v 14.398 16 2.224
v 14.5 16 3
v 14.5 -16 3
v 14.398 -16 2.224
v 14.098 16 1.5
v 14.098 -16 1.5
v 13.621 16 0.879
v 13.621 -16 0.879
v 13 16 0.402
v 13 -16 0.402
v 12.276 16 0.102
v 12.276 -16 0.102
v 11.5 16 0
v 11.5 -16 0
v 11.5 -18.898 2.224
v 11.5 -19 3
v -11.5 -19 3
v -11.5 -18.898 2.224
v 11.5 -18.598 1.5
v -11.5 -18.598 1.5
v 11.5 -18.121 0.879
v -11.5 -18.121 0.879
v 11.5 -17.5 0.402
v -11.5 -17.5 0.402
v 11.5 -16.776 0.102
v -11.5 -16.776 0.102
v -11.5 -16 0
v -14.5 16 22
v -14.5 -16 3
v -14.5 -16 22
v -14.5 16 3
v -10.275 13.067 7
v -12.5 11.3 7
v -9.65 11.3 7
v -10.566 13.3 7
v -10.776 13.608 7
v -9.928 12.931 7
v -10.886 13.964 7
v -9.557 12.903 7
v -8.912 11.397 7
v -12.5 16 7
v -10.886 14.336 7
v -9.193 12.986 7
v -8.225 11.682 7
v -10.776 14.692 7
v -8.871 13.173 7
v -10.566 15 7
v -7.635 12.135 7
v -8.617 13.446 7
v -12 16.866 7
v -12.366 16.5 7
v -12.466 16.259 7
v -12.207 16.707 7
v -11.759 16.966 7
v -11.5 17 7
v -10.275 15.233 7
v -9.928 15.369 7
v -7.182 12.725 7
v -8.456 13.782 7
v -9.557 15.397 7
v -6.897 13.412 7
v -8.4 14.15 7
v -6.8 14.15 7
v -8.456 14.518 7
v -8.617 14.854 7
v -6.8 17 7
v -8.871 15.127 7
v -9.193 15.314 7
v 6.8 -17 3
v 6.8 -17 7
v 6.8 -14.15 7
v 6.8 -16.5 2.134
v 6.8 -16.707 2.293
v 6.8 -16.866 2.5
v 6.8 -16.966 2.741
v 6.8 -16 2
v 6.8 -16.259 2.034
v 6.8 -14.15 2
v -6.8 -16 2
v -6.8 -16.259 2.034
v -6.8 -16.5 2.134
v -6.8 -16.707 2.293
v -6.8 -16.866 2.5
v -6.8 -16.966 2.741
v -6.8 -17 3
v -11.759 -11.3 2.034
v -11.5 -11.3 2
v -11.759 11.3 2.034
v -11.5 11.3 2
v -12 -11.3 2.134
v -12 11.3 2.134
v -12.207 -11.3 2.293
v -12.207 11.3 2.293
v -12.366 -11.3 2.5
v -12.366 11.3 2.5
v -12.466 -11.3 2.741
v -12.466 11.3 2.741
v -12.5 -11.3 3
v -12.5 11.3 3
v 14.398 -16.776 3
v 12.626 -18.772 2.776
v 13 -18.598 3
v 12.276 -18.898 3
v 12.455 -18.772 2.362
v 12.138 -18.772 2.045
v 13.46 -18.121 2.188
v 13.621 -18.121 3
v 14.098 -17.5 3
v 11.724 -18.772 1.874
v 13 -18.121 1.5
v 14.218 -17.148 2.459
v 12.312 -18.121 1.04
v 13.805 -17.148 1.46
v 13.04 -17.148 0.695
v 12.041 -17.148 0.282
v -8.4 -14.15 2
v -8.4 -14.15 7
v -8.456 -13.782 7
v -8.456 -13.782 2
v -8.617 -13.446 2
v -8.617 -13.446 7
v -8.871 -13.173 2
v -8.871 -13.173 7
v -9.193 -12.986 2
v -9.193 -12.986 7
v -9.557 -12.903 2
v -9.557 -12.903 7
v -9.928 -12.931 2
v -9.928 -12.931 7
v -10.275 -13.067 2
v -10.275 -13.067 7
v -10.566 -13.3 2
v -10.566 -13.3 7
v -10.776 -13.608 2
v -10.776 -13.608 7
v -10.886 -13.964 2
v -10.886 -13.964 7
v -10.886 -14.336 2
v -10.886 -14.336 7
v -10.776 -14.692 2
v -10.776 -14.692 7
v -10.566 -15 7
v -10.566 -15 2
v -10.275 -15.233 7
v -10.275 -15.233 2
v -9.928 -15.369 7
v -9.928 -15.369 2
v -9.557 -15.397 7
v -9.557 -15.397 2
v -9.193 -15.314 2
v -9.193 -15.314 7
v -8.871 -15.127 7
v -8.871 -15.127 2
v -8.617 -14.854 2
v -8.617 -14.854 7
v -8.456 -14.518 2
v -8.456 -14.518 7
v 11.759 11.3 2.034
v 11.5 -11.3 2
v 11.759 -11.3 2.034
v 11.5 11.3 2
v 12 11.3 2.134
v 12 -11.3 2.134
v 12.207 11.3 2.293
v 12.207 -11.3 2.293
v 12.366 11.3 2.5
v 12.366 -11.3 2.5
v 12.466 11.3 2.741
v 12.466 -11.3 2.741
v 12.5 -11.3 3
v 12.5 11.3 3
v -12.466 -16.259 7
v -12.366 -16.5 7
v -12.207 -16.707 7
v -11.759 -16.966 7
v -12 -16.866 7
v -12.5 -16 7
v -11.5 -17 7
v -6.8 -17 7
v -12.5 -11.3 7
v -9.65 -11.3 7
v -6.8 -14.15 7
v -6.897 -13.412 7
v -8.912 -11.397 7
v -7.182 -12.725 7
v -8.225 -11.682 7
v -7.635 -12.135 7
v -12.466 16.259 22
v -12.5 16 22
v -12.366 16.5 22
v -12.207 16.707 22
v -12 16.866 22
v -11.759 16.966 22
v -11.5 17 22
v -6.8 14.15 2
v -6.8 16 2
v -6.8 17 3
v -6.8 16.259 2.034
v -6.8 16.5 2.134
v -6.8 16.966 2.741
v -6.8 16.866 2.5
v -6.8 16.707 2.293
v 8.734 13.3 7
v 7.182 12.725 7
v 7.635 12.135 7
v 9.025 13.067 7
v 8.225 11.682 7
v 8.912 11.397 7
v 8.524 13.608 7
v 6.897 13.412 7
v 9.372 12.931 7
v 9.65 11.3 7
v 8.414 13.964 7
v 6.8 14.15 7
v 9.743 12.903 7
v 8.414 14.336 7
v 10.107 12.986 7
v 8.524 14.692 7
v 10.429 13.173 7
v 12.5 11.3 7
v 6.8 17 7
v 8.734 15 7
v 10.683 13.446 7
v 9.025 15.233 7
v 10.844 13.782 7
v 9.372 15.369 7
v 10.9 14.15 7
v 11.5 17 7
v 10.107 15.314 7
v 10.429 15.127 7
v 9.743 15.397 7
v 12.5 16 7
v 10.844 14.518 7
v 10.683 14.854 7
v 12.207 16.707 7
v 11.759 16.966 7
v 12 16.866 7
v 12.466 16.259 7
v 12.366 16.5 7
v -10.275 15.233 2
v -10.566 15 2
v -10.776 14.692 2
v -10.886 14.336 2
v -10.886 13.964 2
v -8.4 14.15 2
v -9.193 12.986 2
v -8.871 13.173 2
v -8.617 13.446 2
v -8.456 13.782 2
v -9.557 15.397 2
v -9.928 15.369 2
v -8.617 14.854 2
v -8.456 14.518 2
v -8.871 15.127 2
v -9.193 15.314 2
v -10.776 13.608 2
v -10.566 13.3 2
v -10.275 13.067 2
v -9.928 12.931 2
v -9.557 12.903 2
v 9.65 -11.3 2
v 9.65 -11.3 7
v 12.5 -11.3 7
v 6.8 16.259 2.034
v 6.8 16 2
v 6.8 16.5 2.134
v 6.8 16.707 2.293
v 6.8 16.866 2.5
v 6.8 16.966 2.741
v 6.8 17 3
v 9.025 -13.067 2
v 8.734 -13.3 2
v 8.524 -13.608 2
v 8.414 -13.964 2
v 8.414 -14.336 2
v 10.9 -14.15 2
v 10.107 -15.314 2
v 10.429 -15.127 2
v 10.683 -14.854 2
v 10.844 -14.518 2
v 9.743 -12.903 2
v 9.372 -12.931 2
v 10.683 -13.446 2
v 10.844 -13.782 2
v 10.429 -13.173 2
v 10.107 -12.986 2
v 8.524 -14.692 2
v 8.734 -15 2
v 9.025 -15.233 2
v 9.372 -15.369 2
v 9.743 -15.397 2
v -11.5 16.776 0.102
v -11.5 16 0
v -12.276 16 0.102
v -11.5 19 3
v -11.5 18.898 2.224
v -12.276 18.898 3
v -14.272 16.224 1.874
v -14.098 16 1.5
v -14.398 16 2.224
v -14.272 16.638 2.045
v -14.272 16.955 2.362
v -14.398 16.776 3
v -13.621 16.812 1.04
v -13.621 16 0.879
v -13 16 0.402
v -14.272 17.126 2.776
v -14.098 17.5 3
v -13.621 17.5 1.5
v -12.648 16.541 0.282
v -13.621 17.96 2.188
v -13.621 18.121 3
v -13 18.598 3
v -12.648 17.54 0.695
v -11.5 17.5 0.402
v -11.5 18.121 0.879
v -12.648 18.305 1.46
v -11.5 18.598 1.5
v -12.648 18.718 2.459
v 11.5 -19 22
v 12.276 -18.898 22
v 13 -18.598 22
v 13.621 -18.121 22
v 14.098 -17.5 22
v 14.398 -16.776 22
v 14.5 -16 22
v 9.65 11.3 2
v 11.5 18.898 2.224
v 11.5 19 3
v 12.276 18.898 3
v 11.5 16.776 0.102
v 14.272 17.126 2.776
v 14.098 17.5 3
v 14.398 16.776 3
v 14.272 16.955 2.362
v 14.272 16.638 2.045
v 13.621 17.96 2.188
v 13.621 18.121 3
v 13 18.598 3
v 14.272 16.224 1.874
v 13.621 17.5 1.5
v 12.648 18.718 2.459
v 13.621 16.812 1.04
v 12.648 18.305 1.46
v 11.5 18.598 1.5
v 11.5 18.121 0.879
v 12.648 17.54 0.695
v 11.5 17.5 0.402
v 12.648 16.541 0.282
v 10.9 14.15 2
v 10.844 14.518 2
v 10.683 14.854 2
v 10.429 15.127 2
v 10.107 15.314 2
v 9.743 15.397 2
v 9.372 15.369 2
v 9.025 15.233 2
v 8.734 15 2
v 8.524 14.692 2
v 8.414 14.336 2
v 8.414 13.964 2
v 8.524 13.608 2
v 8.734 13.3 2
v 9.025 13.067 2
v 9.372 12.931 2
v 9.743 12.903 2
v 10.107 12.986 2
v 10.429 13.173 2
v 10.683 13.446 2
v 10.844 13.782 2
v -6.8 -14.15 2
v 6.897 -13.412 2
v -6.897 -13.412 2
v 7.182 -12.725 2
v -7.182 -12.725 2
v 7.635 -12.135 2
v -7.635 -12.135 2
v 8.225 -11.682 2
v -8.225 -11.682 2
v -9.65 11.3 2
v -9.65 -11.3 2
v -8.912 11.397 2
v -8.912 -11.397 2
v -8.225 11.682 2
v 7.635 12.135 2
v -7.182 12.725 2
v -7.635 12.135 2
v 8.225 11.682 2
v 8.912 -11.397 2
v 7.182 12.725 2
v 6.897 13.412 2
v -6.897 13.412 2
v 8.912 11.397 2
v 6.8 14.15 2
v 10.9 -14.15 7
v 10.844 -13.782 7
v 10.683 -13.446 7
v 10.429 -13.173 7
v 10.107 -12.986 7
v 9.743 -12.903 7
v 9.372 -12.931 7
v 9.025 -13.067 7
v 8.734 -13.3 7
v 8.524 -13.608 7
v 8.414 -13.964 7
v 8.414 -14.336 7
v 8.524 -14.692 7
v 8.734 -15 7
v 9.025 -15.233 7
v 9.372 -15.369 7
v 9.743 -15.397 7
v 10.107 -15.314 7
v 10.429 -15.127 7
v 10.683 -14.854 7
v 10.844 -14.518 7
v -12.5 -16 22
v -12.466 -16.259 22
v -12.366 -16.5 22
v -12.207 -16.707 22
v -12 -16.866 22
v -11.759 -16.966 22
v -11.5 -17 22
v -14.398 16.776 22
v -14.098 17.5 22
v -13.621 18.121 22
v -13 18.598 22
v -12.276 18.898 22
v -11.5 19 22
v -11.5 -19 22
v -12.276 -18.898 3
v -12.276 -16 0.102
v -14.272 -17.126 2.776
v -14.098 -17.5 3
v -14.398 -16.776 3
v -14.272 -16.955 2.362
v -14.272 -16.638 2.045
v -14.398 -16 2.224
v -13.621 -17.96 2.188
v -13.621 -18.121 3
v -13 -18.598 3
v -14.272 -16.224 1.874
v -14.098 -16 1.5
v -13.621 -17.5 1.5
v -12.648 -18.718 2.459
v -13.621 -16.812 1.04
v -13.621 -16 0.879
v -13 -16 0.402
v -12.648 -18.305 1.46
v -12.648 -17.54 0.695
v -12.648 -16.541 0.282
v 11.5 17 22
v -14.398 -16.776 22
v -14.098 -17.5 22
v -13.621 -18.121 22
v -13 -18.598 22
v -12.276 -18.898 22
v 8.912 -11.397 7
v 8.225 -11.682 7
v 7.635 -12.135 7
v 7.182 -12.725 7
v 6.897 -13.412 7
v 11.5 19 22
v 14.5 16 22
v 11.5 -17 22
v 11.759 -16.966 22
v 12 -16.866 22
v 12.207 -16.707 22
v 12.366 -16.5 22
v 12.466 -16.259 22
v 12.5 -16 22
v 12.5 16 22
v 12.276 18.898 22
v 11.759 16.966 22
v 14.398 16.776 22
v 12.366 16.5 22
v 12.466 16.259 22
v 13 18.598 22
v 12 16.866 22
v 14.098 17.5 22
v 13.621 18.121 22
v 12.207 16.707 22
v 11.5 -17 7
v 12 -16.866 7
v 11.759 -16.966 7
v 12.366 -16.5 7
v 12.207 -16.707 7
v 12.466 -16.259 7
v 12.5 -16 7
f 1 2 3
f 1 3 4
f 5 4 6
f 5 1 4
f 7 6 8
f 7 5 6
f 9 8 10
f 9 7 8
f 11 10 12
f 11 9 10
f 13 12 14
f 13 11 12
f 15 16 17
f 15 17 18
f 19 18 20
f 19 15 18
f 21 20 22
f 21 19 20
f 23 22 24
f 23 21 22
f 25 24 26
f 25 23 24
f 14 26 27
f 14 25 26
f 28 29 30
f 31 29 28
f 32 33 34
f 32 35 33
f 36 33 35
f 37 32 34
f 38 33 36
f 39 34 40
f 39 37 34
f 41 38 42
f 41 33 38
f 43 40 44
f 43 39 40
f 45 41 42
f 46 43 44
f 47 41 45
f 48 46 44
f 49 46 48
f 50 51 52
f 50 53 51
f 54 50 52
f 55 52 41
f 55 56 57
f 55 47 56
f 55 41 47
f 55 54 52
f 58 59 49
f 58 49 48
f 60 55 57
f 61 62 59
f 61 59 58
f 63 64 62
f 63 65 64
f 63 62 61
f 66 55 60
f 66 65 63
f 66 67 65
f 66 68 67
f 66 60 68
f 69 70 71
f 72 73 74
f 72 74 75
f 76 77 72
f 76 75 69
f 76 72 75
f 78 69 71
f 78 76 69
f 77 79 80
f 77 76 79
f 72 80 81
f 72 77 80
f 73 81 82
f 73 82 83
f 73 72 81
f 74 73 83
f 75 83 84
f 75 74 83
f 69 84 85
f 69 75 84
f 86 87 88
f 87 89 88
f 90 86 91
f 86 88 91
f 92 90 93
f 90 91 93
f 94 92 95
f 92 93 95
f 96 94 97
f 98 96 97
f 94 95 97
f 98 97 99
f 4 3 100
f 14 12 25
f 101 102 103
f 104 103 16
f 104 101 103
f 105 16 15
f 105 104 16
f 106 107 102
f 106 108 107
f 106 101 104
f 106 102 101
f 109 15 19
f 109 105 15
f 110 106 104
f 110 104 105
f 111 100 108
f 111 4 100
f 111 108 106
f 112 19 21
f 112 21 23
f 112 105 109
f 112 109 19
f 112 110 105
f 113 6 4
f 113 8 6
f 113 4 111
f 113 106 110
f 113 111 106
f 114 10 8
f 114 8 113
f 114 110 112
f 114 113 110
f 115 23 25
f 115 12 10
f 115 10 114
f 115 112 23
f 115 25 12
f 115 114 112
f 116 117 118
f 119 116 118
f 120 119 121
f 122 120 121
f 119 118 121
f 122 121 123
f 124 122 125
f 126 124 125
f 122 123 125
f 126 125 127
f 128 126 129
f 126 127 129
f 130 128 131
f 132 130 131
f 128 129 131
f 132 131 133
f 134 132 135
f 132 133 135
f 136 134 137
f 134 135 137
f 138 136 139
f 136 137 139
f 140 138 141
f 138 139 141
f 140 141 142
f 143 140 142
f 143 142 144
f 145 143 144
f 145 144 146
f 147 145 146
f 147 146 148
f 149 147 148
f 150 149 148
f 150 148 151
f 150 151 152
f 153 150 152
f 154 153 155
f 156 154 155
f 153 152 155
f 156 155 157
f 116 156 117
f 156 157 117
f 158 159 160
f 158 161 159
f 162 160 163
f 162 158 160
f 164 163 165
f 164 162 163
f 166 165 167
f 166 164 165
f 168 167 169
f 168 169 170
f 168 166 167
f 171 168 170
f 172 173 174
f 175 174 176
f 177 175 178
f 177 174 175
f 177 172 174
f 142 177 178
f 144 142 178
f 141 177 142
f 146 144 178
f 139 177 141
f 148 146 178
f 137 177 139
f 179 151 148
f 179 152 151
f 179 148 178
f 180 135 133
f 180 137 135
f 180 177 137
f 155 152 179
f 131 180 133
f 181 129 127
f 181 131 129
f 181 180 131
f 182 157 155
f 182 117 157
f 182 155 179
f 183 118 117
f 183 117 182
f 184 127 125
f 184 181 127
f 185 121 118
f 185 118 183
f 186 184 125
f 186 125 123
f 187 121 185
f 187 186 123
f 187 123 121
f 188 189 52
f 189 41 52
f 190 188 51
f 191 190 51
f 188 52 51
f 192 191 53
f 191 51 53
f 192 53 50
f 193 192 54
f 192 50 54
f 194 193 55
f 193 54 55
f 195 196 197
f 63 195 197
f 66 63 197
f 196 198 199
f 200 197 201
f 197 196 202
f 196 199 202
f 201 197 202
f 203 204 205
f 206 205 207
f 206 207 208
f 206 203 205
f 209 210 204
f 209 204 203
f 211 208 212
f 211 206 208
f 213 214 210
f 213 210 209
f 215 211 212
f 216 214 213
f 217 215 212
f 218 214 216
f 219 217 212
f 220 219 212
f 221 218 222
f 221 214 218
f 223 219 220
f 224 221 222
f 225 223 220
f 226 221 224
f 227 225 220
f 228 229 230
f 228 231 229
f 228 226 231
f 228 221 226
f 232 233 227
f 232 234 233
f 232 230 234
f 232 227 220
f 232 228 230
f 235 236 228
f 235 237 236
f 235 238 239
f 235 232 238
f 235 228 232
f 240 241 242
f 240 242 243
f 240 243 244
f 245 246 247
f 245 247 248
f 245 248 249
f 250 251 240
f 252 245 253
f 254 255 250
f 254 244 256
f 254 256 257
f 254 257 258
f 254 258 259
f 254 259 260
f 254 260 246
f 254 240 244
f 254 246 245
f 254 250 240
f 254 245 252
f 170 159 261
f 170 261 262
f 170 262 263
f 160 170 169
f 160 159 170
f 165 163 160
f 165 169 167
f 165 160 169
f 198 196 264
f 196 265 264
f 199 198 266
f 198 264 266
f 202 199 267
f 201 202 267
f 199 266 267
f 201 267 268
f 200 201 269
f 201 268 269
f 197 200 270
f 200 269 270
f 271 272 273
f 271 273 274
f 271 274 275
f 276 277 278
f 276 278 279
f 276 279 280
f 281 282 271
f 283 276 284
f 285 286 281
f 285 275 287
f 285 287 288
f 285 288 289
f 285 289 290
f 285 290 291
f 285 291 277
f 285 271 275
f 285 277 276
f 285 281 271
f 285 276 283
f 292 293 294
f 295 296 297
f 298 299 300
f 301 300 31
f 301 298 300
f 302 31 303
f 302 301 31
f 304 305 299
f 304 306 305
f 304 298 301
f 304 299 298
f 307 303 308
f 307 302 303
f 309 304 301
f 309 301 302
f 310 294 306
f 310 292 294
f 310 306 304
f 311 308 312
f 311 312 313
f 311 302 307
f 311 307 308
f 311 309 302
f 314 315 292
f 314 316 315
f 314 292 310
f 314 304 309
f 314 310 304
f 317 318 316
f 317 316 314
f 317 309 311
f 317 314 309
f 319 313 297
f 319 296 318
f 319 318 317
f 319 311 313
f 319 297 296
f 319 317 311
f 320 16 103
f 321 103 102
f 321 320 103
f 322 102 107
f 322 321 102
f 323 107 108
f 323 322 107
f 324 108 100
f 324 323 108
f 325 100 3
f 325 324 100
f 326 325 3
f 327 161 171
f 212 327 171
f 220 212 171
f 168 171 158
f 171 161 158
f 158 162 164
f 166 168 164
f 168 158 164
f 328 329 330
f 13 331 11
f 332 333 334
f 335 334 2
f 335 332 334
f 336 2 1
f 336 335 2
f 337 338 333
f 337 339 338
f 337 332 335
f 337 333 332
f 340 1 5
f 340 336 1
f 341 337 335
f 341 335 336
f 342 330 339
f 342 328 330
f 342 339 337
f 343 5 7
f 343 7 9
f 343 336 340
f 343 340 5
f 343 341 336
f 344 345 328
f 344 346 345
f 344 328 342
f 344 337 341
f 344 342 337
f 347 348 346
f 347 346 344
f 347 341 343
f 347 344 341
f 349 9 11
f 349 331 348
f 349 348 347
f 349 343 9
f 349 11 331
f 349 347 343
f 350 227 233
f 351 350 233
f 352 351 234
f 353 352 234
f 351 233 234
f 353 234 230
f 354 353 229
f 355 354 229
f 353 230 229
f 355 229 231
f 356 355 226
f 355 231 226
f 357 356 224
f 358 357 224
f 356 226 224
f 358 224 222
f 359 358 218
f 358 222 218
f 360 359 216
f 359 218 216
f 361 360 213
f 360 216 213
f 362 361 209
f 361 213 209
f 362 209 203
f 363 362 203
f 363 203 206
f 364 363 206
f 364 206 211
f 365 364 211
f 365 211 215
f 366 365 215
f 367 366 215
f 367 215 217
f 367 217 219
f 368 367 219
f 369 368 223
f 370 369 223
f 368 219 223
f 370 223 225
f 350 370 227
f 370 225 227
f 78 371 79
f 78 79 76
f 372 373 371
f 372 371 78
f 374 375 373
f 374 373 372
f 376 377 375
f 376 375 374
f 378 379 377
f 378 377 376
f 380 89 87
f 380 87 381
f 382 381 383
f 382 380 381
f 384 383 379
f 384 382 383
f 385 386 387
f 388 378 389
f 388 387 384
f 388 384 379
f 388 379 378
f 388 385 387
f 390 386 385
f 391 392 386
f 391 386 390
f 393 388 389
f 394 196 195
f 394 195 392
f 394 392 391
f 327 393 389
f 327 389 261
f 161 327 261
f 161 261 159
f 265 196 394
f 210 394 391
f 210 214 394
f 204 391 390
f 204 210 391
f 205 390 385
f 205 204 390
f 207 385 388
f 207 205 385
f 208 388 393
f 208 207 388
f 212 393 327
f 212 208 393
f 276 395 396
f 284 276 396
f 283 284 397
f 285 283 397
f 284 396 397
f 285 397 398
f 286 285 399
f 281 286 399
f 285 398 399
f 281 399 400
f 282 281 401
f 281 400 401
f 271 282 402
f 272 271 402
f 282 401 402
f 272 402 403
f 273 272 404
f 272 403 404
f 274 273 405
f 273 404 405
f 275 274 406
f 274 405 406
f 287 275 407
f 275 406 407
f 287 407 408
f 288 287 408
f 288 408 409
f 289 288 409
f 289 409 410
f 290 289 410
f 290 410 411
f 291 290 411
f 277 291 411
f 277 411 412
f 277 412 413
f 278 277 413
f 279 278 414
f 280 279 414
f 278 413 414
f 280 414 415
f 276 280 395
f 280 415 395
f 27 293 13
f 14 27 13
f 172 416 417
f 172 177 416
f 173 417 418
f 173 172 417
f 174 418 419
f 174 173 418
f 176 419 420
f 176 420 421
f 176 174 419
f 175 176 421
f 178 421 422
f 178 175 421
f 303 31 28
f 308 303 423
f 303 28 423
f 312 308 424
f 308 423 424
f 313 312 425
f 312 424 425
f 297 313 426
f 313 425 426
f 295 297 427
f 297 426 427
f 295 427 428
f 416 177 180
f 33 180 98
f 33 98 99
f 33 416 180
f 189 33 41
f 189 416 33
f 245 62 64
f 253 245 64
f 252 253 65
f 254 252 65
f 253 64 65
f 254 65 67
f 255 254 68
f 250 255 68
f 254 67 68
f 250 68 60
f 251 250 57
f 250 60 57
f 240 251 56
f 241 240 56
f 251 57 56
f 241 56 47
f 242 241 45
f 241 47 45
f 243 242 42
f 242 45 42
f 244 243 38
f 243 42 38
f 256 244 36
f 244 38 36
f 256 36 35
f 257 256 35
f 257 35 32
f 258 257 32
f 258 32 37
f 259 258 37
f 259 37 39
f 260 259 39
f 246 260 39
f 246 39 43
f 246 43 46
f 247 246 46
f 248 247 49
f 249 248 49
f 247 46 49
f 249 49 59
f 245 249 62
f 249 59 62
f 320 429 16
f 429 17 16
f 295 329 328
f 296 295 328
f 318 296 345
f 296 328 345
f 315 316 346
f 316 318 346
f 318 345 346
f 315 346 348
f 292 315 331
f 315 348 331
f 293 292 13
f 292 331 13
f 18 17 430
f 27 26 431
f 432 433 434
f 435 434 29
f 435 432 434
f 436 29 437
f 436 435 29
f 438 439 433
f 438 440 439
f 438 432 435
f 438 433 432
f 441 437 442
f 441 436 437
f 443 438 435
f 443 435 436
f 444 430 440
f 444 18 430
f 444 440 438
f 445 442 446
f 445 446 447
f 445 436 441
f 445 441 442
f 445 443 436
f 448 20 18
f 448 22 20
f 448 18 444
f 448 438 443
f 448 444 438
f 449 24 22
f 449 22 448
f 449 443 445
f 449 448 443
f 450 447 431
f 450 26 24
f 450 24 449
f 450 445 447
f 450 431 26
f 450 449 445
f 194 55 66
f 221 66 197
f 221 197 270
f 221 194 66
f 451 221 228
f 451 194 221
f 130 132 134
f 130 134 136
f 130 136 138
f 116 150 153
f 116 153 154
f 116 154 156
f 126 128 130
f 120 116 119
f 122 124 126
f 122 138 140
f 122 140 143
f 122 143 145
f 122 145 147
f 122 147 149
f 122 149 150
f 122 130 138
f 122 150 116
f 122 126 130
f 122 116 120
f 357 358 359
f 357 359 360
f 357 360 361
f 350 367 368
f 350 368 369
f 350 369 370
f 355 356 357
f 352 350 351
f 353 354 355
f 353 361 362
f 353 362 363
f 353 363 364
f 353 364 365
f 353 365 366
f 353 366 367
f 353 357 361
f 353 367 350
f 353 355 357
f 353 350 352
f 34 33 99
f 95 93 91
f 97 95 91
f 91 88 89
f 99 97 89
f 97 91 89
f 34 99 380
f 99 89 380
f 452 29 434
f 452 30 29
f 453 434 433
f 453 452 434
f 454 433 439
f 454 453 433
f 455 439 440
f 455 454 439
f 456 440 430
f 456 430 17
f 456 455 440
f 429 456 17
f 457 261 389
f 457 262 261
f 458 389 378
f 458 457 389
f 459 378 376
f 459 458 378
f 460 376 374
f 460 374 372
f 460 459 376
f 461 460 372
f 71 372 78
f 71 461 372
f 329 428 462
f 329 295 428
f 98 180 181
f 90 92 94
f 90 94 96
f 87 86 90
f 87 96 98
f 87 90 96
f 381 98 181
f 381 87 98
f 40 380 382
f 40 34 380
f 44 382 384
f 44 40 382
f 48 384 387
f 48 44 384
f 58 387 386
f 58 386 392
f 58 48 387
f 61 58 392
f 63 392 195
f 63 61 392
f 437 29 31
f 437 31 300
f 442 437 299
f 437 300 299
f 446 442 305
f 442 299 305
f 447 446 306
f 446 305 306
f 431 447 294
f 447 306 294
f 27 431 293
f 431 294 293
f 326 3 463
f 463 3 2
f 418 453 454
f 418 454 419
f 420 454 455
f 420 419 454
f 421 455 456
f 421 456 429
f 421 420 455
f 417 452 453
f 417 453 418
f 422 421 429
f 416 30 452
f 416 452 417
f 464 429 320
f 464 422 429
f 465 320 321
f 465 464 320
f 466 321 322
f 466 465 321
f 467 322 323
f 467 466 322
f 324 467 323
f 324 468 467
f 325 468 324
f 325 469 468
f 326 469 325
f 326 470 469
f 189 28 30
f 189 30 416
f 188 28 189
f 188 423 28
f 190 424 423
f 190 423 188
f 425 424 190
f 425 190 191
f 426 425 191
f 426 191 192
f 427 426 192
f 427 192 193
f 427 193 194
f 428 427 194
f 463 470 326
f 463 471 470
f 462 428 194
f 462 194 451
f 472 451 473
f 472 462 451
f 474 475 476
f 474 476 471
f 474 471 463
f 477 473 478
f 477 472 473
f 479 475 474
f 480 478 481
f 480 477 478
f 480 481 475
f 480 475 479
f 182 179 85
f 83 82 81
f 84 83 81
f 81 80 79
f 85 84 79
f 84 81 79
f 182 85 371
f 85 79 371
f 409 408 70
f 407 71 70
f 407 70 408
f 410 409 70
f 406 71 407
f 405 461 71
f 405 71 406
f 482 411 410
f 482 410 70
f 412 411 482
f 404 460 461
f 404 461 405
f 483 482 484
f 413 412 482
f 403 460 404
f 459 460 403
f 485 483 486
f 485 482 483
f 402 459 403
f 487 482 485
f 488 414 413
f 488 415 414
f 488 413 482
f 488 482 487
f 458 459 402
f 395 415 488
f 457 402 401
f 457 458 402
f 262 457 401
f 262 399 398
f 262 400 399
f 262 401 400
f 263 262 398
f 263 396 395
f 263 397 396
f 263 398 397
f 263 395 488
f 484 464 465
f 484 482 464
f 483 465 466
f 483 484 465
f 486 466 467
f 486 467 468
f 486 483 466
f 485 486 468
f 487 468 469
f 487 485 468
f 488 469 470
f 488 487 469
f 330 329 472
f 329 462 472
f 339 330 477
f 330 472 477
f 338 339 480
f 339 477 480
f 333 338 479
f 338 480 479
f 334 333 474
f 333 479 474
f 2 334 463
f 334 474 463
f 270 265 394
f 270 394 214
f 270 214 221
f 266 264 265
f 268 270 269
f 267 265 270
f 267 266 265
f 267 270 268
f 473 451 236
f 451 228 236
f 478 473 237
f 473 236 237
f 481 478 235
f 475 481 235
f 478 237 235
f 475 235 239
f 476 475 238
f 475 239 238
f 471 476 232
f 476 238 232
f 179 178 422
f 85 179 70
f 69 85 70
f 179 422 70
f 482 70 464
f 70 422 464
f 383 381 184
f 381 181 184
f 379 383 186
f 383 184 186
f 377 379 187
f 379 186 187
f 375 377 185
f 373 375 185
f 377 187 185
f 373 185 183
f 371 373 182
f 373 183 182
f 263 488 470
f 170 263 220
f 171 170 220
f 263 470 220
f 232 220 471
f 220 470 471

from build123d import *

# Parameters (mm, degrees)
SKETCH_W        = 29
SKETCH_H        = 38
PAD_DEPTH       = 22
SKETCH001_W     = 25
SKETCH001_H     = 34
POCKET_DEPTH    = 20
SKETCH002_W     = 5.7
SKETCH002_H     = 5.7
PAD001_DEPTH    = 5
SKETCH003_R     = 1.25
POCKET001_DEPTH = 5
FILLET_R        = 2.85
FILLET001_R     = 1
FILLET002_R     = 3


with BuildPart() as part:
    # Sketch → Pad (new body)
    with BuildSketch(Plane.XY):
        Rectangle(SKETCH_W, SKETCH_H)
    extrude(amount=PAD_DEPTH)

    # Sketch001 (on DatumPlane) → Pocket (cut)
    with BuildSketch(Plane.XY.offset(22)):
        Rectangle(SKETCH001_W, SKETCH001_H)
    extrude(amount=-POCKET_DEPTH, mode=Mode.SUBTRACT)

    # Sketch002 (on DatumPlane) → Pad001 (join)
    with BuildSketch(Plane.XY.offset(2)):
        with Locations((-9.65, 14.15)):
            Rectangle(SKETCH002_W, SKETCH002_H)
        with Locations((9.65, 14.15)):
            Rectangle(SKETCH002_W, SKETCH002_H)
        with Locations((9.65, -14.15)):
            Rectangle(SKETCH002_W, SKETCH002_H)
        with Locations((-9.65, -14.15)):
            Rectangle(SKETCH002_W, SKETCH002_H)
    extrude(amount=PAD001_DEPTH)

    # Sketch003 (on DatumPlane) → Pocket001 (cut)
    with BuildSketch(Plane.XY.offset(7)):
        with Locations((-9.65, 14.15)):
            Circle(SKETCH003_R)
        with Locations((9.65, 14.15)):
            Circle(SKETCH003_R)
        with Locations((9.65, -14.15)):
            Circle(SKETCH003_R)
        with Locations((-9.65, -14.15)):
            Circle(SKETCH003_R)
    extrude(amount=-POCKET001_DEPTH, mode=Mode.SUBTRACT)

    # Fillet
    fillet_edges = [part.edges().sort_by_distance(p)[0] for p in [
        (6.8, 11.3, 4.5),
        (-6.8, 11.3, 4.5),
        (-6.8, -11.3, 4.5),
        (6.8, -11.3, 4.5),
    ]]
    fillet(fillet_edges, radius=FILLET_R)

    # Fillet001
    fillet001_edges = [part.edges().sort_by_distance(p)[0] for p in [
        (-12.5, 0, 2),
        (0, 17, 2),
        (12.5, 0, 2),
        (0, -17, 2),
        (-12.5, 17, 14.5),
        (-12.5, -17, 14.5),
        (12.5, 17, 14.5),
        (12.5, -17, 14.5),
    ]]
    fillet(fillet001_edges, radius=FILLET001_R)

    # Fillet002
    fillet002_edges = [part.edges().sort_by_distance(p)[0] for p in [
        (0, 19, 0),
        (14.5, 19, 11),
        (14.5, 0, 0),
        (14.5, -19, 11),
        (0, -19, 0),
        (-14.5, -19, 11),
        (-14.5, 0, 0),
        (-14.5, 19, 11),
    ]]
    fillet(fillet002_edges, radius=FILLET002_R)


solid = part.part
